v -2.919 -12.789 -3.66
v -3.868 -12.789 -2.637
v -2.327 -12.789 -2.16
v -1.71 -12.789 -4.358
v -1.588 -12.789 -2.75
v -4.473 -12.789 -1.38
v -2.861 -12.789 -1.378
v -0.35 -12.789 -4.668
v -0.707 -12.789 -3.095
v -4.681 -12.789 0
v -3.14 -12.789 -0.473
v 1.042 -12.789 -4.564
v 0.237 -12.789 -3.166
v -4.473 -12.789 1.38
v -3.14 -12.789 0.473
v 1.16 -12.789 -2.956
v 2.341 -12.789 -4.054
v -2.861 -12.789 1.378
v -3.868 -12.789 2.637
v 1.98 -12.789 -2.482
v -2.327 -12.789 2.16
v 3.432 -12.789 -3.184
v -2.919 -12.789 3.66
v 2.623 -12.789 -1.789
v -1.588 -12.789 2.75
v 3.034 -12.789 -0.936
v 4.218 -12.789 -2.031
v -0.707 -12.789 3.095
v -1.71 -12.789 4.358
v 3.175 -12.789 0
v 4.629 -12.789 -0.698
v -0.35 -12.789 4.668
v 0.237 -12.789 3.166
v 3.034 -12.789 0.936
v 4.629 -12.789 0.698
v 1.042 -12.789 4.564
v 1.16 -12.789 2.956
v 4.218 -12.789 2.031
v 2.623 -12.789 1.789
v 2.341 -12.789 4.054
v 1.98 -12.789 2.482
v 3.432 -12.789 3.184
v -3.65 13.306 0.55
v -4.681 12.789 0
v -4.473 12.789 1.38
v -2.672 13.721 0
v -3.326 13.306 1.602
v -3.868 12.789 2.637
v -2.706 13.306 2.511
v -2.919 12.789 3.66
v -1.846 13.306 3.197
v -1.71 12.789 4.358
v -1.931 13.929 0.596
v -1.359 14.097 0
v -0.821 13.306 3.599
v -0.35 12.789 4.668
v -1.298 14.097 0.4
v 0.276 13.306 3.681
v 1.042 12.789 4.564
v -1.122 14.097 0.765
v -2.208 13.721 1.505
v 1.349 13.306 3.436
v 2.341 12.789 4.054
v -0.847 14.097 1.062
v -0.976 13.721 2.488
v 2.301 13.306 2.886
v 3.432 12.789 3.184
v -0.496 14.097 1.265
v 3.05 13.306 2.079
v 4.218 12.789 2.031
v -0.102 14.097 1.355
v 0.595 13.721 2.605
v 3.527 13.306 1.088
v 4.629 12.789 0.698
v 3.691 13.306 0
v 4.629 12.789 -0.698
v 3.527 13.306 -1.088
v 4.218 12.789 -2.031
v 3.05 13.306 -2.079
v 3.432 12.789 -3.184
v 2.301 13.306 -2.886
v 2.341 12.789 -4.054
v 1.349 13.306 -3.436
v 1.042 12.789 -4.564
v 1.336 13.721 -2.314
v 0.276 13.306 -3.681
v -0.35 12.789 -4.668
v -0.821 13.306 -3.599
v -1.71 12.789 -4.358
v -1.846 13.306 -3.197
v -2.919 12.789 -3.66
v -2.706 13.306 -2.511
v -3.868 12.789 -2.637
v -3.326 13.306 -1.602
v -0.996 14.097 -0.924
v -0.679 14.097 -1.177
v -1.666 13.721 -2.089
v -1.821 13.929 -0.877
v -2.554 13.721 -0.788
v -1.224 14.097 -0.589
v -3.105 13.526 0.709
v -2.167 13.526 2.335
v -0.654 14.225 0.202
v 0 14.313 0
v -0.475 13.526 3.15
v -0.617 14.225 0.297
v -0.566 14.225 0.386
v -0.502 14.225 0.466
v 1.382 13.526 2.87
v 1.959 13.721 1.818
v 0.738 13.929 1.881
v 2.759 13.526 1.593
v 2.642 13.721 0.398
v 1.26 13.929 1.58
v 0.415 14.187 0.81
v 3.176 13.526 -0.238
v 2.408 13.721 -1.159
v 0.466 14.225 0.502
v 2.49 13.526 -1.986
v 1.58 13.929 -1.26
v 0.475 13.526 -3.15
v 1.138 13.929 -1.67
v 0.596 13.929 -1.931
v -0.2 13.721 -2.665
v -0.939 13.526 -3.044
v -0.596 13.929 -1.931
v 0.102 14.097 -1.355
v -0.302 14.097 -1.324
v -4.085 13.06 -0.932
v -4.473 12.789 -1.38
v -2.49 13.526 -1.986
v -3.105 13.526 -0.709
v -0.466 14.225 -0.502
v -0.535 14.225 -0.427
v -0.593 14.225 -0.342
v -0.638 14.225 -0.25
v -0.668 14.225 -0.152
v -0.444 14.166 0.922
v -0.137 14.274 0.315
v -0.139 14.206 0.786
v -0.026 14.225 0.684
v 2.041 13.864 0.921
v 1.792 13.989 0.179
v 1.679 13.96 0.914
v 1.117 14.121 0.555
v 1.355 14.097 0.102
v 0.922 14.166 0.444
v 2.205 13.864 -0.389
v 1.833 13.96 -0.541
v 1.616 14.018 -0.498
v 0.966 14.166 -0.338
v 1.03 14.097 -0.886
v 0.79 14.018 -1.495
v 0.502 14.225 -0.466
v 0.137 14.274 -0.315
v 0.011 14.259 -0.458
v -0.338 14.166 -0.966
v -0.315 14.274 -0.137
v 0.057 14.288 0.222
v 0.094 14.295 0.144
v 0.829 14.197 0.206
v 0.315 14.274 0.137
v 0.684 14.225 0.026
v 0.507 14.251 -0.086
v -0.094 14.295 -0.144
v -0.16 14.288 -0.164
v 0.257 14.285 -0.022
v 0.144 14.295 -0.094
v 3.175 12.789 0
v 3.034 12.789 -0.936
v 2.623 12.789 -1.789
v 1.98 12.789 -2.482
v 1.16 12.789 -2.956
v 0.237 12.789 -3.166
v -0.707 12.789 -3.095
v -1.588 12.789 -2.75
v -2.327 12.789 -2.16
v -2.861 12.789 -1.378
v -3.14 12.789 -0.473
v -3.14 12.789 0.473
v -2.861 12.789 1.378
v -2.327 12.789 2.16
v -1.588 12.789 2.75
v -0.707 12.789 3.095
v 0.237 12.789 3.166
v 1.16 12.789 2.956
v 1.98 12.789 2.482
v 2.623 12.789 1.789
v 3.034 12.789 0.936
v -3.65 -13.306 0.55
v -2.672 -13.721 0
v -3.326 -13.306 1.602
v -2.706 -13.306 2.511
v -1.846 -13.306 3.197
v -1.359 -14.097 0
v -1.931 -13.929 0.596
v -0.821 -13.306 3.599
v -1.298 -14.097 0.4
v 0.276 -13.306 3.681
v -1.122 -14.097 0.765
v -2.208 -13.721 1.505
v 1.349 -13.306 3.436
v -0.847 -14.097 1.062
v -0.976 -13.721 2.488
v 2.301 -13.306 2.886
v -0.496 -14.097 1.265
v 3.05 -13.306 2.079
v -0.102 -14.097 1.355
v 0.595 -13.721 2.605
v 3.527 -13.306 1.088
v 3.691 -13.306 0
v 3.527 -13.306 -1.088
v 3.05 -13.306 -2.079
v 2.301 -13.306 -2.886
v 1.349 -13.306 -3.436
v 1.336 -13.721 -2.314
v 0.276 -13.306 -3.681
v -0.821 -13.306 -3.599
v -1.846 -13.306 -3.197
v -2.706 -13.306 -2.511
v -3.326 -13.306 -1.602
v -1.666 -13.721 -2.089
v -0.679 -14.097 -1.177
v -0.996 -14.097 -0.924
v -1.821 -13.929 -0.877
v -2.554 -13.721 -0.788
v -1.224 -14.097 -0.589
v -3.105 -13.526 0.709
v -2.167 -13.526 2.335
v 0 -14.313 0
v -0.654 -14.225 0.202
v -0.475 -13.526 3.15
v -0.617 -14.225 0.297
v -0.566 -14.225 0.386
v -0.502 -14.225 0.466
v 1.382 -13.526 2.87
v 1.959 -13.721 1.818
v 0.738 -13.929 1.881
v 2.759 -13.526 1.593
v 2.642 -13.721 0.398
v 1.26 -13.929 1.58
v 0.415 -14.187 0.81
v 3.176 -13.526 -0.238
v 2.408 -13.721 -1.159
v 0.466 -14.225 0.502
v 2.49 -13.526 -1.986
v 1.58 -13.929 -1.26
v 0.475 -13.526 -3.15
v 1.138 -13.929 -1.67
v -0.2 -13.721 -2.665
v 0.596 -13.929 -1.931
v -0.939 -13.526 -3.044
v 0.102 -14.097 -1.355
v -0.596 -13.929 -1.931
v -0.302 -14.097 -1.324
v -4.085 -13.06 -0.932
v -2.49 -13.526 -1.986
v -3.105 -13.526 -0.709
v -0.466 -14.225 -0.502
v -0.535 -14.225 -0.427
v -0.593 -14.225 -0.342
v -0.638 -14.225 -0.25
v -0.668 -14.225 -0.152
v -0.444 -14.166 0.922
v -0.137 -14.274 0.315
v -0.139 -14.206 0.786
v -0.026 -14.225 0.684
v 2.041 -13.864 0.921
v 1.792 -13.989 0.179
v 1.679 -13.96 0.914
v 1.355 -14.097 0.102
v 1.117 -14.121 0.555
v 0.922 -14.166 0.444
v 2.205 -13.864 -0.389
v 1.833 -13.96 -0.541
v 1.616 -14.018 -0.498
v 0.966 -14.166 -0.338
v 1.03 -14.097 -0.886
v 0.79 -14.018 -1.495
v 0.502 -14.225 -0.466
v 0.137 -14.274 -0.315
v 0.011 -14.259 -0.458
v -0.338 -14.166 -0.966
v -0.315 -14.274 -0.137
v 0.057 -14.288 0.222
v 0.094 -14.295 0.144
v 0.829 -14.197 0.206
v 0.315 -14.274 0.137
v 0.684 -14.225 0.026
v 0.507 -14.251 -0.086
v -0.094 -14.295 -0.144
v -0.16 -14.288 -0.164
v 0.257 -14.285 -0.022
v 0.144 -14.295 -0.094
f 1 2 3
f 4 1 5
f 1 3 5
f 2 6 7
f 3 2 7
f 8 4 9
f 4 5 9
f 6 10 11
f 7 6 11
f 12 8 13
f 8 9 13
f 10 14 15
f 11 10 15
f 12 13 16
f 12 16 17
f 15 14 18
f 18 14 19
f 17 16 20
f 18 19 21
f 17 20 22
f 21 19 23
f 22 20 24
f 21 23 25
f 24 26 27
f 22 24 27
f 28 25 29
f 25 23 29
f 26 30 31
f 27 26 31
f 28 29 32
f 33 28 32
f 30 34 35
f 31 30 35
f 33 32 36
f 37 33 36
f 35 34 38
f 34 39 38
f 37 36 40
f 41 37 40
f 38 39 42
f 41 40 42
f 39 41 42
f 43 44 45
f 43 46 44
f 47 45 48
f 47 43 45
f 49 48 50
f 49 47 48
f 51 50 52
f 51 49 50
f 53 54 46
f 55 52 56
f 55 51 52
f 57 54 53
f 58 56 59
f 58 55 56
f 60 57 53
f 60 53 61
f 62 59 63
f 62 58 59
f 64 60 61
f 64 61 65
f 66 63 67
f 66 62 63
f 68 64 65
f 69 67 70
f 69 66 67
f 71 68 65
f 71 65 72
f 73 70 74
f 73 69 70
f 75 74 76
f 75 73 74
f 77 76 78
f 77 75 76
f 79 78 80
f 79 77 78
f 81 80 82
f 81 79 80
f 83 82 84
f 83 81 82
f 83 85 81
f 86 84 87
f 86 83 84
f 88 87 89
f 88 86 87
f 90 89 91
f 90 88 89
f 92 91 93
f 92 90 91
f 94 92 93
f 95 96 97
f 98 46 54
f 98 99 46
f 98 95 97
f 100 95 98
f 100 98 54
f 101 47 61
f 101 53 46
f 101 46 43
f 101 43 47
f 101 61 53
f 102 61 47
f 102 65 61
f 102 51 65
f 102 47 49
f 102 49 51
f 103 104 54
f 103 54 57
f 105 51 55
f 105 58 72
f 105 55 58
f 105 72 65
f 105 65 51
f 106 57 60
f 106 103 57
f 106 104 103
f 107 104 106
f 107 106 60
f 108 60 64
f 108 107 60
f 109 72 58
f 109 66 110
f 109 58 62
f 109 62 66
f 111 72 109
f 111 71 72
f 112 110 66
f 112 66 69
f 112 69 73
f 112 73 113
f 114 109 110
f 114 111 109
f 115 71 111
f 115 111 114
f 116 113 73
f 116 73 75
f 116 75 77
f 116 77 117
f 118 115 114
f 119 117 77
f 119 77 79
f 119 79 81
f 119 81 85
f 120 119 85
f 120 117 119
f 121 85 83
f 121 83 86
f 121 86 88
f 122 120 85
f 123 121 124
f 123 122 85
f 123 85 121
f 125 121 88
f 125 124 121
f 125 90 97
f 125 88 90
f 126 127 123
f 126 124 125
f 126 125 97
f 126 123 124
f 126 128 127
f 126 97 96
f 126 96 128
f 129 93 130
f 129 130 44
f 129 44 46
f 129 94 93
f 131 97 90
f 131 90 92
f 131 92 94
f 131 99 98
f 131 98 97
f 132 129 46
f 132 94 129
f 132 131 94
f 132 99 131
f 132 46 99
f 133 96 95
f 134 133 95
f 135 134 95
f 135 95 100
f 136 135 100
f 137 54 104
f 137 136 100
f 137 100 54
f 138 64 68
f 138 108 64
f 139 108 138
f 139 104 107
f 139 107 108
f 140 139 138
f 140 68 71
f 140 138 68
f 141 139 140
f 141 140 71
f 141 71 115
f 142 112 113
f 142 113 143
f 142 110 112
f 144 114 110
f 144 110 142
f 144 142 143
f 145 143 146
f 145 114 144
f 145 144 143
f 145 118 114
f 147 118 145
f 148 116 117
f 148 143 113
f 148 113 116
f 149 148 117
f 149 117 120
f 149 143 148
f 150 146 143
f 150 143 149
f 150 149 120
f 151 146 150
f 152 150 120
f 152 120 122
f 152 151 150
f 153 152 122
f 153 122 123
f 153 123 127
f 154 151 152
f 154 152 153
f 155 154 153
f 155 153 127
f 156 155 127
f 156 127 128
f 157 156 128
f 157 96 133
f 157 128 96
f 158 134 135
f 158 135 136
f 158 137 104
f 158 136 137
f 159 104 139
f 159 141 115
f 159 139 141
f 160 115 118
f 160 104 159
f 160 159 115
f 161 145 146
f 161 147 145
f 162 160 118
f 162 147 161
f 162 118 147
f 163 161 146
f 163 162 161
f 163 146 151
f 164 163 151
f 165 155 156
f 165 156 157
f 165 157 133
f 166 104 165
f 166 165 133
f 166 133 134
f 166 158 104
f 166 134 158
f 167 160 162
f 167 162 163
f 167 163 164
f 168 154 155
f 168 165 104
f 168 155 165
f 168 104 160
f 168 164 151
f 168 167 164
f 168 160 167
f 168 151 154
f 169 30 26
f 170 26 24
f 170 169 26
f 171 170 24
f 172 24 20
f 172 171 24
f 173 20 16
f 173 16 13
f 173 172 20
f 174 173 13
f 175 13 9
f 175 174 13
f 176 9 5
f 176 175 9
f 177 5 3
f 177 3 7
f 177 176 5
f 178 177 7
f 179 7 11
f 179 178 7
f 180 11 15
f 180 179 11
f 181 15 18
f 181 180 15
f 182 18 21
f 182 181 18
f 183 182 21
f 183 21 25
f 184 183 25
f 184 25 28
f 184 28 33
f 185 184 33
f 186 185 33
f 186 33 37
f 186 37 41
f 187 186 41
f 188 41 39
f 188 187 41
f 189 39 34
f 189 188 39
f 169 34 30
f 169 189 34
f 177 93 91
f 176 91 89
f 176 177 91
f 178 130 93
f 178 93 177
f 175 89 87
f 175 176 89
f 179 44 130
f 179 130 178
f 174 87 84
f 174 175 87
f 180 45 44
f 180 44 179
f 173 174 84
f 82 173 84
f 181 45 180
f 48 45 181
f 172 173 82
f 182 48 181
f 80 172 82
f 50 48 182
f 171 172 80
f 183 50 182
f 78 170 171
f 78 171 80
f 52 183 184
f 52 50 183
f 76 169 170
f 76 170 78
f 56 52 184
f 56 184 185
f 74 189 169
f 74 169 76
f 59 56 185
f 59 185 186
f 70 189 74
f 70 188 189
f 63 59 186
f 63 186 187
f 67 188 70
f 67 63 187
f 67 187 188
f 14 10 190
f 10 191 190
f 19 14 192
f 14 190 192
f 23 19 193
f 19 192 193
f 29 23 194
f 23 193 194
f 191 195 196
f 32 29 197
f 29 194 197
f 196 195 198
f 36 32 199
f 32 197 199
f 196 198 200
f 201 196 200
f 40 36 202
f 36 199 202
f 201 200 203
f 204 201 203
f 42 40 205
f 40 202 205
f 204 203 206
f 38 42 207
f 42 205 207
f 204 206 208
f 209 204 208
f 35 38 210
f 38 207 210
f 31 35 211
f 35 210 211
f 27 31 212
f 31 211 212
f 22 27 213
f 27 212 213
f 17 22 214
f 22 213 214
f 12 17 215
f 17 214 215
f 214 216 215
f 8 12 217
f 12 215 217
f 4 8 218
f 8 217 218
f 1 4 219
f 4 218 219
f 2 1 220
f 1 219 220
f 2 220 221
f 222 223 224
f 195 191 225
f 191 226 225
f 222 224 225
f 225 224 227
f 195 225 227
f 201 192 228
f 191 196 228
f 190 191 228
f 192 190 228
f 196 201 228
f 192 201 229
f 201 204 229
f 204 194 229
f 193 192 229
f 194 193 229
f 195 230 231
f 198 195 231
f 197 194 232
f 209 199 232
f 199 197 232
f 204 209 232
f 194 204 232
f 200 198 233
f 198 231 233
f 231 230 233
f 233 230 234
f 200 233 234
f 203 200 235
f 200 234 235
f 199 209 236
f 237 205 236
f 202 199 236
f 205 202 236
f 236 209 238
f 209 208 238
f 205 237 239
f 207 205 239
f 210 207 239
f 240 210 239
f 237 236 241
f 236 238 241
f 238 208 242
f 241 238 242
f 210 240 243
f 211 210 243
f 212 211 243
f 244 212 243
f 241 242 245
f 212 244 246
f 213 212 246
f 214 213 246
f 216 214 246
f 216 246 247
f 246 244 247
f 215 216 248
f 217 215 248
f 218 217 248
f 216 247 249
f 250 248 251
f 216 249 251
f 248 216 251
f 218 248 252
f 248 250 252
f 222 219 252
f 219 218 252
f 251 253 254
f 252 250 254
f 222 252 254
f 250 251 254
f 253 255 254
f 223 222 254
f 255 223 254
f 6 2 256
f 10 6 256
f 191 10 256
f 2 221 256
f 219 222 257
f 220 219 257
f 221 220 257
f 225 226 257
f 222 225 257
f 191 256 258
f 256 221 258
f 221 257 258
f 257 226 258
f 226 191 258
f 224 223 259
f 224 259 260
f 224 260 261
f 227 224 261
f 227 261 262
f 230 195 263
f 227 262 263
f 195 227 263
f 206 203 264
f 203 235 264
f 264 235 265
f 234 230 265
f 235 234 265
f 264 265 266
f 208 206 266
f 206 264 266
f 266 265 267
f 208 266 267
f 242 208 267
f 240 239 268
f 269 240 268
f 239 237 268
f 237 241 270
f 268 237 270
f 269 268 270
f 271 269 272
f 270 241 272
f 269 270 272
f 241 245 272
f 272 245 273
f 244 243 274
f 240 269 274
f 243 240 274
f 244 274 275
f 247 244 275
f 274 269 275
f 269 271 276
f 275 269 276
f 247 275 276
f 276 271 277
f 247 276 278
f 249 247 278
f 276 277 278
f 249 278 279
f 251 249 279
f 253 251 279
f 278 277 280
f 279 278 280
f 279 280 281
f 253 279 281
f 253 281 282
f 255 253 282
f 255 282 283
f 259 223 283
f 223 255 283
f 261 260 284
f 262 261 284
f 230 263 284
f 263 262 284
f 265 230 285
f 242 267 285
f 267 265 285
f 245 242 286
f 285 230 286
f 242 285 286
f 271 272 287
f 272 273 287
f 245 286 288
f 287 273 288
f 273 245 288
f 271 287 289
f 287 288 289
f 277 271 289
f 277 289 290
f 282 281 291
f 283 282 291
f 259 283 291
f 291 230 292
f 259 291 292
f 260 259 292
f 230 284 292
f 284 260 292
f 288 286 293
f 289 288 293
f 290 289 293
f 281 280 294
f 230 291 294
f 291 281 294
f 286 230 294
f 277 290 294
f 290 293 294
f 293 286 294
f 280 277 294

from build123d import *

# Parameters (mm, degrees)
SKETCH1_R           = 3.175
BOSS_EXTRUDE1_DEPTH = 12.7889


with BuildPart() as part:
    # Sketch1 → Boss-Extrude1 (new body, symmetric)
    with BuildSketch(Plane(origin=(0, 0, 0), x_dir=(1, 0, 0), z_dir=(0, 1, 0))):
        Circle(SKETCH1_R)
    extrude(amount=BOSS_EXTRUDE1_DEPTH, both=True)

    # Sketch3 → Revolve1 (revolve)
    with BuildSketch(Plane.XY):
        with BuildLine():
            Line((0, 12.7889), (-4.68122, 12.7889))
            add(Edge.make_bspline(
                [(-4.68122, 12.7889), (-2.485687352, 14.067463283), (0, 14.3129)],
                knots=[0, 0, 0, 1, 1, 1], degree=2))
            Line((0, 14.3129), (0, 12.7889))
        make_face()
    revolve1 = revolve(axis=Axis((0, 12.7889, 0), (0, 1, 0)))

    # Mirror1: Revolve1 across plane
    add(revolve1.mirror(Plane.ZX))


solid = part.part
